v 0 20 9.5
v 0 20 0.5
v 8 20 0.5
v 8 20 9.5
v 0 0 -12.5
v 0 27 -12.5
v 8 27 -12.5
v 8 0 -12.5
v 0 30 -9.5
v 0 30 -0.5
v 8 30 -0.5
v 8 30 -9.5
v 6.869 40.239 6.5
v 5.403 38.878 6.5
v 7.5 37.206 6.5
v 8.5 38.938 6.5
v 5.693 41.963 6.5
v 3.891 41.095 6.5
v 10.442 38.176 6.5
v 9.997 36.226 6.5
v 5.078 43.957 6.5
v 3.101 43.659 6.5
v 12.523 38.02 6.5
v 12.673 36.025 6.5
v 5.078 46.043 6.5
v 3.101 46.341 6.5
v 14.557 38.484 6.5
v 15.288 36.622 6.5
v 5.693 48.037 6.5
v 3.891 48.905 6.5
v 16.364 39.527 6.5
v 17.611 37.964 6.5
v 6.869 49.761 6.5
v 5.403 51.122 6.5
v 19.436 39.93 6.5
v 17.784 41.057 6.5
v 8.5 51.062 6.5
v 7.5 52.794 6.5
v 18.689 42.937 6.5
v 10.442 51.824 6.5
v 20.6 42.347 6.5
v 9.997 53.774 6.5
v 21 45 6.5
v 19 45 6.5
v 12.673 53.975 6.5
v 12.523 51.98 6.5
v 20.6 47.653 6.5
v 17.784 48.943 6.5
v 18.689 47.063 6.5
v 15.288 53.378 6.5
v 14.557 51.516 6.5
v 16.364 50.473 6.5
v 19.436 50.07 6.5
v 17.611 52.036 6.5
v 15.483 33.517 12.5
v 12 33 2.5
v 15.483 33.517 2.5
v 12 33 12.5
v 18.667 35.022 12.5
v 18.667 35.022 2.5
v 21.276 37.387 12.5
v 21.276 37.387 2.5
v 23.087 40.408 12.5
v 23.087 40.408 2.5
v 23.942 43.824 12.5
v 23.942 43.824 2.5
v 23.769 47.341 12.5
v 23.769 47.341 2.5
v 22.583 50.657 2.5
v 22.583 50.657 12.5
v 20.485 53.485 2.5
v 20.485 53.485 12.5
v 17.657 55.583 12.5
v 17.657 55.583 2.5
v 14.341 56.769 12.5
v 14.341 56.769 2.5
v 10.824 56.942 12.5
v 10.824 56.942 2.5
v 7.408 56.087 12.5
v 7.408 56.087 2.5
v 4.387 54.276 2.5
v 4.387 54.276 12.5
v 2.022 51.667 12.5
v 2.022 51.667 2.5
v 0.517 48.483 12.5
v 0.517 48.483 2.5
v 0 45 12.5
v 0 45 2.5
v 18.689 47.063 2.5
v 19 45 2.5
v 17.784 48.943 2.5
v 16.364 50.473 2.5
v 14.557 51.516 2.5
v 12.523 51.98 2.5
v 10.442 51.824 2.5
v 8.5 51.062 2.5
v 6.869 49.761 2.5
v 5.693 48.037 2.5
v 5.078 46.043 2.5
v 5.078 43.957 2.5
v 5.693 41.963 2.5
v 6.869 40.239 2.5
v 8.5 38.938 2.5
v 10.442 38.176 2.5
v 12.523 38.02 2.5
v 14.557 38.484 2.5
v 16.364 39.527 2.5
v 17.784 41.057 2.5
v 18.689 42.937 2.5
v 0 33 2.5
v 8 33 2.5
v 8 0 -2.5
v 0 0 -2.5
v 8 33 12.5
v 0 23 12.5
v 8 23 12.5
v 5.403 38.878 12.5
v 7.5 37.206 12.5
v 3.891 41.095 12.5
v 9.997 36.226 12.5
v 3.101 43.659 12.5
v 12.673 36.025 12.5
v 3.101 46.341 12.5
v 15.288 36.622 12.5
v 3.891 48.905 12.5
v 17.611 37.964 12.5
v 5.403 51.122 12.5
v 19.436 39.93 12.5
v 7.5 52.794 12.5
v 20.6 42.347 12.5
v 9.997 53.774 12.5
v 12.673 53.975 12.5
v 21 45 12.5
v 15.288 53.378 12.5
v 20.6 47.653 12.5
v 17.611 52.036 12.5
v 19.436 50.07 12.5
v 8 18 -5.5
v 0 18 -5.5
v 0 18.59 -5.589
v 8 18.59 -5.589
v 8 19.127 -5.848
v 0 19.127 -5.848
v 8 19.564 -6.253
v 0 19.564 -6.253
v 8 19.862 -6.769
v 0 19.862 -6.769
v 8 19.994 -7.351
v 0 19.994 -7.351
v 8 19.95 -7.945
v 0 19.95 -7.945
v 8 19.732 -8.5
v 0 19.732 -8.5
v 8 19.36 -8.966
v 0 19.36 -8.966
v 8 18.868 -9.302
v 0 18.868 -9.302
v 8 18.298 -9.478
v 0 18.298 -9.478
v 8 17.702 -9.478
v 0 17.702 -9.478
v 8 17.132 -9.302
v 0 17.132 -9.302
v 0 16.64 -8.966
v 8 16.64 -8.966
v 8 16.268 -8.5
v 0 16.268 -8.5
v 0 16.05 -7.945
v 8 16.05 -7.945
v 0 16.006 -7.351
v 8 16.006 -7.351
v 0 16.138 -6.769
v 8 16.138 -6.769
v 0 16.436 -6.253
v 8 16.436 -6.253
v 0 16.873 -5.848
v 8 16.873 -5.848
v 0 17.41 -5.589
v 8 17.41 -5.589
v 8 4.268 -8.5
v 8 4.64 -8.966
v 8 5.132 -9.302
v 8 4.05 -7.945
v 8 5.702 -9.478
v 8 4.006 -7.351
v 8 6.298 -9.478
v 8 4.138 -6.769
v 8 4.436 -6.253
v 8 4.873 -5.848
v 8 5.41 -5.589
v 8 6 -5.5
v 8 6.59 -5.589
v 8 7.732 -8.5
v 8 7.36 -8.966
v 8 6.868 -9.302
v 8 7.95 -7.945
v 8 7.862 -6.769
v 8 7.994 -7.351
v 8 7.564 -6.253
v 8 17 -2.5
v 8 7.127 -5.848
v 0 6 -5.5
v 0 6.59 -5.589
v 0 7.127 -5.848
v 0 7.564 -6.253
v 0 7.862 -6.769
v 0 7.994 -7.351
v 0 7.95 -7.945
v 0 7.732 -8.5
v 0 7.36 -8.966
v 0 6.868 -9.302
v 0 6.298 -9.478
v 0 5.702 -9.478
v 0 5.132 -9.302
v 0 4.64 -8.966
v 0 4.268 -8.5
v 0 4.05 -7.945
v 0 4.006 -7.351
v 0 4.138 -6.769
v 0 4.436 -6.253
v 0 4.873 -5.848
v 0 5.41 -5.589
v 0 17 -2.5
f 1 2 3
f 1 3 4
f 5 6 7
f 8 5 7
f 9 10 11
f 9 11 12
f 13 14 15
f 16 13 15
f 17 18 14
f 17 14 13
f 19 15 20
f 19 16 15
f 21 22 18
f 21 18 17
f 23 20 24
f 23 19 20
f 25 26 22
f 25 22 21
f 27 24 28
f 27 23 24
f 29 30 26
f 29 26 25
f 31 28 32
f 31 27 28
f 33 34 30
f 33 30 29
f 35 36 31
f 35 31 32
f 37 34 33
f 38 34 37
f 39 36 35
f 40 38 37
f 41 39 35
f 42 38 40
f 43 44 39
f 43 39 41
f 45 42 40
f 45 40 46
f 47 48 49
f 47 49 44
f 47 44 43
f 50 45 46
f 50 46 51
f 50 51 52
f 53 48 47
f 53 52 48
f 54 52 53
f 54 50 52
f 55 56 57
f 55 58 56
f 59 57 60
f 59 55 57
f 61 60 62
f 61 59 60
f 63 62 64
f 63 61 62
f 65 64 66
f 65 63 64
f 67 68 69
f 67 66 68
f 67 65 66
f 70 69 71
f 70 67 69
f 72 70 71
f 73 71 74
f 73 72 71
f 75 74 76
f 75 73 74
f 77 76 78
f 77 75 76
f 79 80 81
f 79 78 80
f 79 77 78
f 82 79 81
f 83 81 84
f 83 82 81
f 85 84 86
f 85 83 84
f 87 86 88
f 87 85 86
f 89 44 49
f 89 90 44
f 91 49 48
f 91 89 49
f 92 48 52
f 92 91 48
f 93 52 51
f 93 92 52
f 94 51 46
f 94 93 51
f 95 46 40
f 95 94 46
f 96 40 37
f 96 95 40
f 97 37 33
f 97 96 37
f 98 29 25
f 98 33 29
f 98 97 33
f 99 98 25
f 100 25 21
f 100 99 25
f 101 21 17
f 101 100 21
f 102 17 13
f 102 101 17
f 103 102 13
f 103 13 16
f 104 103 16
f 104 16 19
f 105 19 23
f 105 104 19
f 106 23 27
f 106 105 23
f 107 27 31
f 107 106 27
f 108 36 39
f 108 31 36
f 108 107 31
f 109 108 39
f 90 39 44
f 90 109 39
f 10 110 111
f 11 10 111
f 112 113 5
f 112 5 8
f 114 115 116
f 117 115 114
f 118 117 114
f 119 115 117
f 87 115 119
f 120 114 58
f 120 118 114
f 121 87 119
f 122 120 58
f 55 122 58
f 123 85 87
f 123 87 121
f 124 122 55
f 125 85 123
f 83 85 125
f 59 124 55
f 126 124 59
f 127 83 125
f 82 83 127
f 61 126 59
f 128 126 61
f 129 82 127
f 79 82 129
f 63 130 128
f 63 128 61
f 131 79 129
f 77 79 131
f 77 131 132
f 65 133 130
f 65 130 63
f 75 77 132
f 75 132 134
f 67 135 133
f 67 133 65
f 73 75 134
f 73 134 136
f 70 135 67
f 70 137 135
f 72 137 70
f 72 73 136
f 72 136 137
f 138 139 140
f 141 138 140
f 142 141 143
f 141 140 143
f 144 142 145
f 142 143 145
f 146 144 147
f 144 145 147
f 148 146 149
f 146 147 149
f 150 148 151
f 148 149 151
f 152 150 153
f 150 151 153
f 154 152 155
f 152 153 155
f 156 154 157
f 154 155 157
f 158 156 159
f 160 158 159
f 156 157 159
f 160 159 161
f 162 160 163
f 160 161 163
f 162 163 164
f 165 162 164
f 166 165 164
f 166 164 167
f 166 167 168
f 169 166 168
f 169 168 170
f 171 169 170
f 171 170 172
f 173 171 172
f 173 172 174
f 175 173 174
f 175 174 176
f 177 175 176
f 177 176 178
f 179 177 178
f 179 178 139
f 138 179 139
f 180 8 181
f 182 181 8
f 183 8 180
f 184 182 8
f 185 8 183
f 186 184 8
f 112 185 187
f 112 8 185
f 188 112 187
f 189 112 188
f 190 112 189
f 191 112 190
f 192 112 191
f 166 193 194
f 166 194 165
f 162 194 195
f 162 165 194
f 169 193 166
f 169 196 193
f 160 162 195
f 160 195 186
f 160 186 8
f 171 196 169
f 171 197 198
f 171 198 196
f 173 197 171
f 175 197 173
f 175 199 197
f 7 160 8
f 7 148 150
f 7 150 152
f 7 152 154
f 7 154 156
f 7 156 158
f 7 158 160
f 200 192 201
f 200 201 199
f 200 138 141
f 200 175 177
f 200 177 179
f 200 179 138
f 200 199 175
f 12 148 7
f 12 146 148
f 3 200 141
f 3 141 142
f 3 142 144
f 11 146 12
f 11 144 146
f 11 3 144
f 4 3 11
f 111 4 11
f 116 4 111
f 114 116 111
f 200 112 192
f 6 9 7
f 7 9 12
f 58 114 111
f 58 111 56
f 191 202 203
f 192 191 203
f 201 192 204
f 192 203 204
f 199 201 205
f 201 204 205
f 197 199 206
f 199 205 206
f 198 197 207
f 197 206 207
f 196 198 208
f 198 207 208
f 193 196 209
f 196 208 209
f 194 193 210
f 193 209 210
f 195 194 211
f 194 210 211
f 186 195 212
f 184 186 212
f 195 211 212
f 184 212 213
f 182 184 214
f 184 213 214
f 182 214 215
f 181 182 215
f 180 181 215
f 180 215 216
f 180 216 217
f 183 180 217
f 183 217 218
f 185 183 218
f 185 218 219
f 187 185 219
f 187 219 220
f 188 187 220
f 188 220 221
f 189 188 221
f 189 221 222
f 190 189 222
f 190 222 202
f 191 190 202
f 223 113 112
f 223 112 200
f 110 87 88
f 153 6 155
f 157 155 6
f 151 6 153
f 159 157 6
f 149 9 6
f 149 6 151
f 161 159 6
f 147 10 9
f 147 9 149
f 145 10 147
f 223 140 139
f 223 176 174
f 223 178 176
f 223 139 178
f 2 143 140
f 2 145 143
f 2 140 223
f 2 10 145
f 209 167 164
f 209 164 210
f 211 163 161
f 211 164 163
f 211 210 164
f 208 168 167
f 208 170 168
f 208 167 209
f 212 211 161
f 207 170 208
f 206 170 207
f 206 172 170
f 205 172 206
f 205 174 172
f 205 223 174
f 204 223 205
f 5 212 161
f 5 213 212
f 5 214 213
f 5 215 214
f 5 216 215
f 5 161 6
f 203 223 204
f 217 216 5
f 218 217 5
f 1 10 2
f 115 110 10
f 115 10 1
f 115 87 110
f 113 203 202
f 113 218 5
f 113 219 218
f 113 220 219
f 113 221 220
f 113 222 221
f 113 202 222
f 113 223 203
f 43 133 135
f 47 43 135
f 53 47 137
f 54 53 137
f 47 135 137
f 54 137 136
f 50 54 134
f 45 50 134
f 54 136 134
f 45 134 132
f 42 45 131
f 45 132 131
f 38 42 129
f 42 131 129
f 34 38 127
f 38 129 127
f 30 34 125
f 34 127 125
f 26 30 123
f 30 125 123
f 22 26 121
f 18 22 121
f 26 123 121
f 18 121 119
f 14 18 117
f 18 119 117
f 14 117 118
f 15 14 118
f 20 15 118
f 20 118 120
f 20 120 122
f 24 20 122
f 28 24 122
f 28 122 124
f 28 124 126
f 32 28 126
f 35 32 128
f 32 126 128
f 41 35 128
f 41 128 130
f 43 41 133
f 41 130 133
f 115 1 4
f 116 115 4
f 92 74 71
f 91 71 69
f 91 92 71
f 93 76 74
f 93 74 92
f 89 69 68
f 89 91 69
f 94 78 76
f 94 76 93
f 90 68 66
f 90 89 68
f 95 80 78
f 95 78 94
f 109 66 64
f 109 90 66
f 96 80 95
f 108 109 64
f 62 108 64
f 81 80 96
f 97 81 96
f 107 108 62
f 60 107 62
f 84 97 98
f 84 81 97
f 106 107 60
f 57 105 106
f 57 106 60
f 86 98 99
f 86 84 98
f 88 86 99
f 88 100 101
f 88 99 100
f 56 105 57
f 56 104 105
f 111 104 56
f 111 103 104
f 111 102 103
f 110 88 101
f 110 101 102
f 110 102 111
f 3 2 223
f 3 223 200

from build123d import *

# Parameters (mm, degrees)
SKETCH_1_R               = 7
EXTRUDE_1_DEPTH          = 12.5
CUT_EXTRUDE_3_DEPTH      = 64.097147321
CUT_EXTRUDE_3_DEPTH_BACK = 64.097147321
SKETCH_5_OUTSIDE_W       = 40.342
SKETCH_5_OUTSIDE_H       = 72.342
SKETCH_2_R               = 2
CUT_EXTRUDE_1_DEPTH      = 64.097147321
SKETCH_4_R               = 9
CUT_EXTRUDE_2_DEPTH      = 6
CHAMFER_1_SIZE           = 3


with BuildPart() as part:
    # 草图1 → 凸台-拉伸1 (new, symmetric)
    with BuildSketch(Plane.XY):
        with BuildLine():
            Line((0, 0), (8, 0))
            Line((8, 0), (8, 33))
            Line((8, 33), (12, 33))
            ThreePointArc((12, 33), (20.485281374, 53.485281374), (0, 45))
            Line((0, 45), (0, 0))
        make_face()
        with Locations((12, 45)):
            Circle(SKETCH_1_R, mode=Mode.SUBTRACT)
    extrude(amount=EXTRUDE_1_DEPTH, both=True)

    # 草图5 outside → 切除-拉伸3 (cut, two sides: drawn at the far end of the back side and taken through both)
    with BuildSketch(Plane(origin=(0, 0, 0), x_dir=(0, 0, -1), z_dir=(1, 0, 0)).offset(-CUT_EXTRUDE_3_DEPTH_BACK)):
        with Locations((0, 28.5)):
            Rectangle(SKETCH_5_OUTSIDE_W, SKETCH_5_OUTSIDE_H)
        Polygon((-12.5, 57), (-2.5, 57), (-2.5, 30), (12.5, 30), (12.5, 0), (2.5, 0), (2.5, 20), (-12.5, 20), align=None, mode=Mode.SUBTRACT)
    extrude(amount=CUT_EXTRUDE_3_DEPTH + CUT_EXTRUDE_3_DEPTH_BACK, mode=Mode.SUBTRACT)

    # 草图2 → 切除-拉伸1 (cut, through all)
    with BuildSketch(Plane.ZY):
        with Locations((-7.5, 18)):
            Circle(SKETCH_2_R)
        with Locations((-7.5, 6)):
            Circle(SKETCH_2_R)
    extrude(amount=-CUT_EXTRUDE_1_DEPTH, mode=Mode.SUBTRACT)

    # 草图4 → 切除-拉伸2 (cut)
    with BuildSketch(Plane.XY.offset(12.5)):
        with Locations((12, 45)):
            Circle(SKETCH_4_R)
    extrude(amount=-CUT_EXTRUDE_2_DEPTH, mode=Mode.SUBTRACT)

    # 倒角1
    chamfer_1_edges = [part.edges().sort_by_distance(p)[0] for p in [
        (4, 30, 2.5),
        (4, 30, -12.5),
        (4, 20, -2.5),
        (4, 20, 12.5),
    ]]
    chamfer(chamfer_1_edges, length=CHAMFER_1_SIZE)


solid = part.part
